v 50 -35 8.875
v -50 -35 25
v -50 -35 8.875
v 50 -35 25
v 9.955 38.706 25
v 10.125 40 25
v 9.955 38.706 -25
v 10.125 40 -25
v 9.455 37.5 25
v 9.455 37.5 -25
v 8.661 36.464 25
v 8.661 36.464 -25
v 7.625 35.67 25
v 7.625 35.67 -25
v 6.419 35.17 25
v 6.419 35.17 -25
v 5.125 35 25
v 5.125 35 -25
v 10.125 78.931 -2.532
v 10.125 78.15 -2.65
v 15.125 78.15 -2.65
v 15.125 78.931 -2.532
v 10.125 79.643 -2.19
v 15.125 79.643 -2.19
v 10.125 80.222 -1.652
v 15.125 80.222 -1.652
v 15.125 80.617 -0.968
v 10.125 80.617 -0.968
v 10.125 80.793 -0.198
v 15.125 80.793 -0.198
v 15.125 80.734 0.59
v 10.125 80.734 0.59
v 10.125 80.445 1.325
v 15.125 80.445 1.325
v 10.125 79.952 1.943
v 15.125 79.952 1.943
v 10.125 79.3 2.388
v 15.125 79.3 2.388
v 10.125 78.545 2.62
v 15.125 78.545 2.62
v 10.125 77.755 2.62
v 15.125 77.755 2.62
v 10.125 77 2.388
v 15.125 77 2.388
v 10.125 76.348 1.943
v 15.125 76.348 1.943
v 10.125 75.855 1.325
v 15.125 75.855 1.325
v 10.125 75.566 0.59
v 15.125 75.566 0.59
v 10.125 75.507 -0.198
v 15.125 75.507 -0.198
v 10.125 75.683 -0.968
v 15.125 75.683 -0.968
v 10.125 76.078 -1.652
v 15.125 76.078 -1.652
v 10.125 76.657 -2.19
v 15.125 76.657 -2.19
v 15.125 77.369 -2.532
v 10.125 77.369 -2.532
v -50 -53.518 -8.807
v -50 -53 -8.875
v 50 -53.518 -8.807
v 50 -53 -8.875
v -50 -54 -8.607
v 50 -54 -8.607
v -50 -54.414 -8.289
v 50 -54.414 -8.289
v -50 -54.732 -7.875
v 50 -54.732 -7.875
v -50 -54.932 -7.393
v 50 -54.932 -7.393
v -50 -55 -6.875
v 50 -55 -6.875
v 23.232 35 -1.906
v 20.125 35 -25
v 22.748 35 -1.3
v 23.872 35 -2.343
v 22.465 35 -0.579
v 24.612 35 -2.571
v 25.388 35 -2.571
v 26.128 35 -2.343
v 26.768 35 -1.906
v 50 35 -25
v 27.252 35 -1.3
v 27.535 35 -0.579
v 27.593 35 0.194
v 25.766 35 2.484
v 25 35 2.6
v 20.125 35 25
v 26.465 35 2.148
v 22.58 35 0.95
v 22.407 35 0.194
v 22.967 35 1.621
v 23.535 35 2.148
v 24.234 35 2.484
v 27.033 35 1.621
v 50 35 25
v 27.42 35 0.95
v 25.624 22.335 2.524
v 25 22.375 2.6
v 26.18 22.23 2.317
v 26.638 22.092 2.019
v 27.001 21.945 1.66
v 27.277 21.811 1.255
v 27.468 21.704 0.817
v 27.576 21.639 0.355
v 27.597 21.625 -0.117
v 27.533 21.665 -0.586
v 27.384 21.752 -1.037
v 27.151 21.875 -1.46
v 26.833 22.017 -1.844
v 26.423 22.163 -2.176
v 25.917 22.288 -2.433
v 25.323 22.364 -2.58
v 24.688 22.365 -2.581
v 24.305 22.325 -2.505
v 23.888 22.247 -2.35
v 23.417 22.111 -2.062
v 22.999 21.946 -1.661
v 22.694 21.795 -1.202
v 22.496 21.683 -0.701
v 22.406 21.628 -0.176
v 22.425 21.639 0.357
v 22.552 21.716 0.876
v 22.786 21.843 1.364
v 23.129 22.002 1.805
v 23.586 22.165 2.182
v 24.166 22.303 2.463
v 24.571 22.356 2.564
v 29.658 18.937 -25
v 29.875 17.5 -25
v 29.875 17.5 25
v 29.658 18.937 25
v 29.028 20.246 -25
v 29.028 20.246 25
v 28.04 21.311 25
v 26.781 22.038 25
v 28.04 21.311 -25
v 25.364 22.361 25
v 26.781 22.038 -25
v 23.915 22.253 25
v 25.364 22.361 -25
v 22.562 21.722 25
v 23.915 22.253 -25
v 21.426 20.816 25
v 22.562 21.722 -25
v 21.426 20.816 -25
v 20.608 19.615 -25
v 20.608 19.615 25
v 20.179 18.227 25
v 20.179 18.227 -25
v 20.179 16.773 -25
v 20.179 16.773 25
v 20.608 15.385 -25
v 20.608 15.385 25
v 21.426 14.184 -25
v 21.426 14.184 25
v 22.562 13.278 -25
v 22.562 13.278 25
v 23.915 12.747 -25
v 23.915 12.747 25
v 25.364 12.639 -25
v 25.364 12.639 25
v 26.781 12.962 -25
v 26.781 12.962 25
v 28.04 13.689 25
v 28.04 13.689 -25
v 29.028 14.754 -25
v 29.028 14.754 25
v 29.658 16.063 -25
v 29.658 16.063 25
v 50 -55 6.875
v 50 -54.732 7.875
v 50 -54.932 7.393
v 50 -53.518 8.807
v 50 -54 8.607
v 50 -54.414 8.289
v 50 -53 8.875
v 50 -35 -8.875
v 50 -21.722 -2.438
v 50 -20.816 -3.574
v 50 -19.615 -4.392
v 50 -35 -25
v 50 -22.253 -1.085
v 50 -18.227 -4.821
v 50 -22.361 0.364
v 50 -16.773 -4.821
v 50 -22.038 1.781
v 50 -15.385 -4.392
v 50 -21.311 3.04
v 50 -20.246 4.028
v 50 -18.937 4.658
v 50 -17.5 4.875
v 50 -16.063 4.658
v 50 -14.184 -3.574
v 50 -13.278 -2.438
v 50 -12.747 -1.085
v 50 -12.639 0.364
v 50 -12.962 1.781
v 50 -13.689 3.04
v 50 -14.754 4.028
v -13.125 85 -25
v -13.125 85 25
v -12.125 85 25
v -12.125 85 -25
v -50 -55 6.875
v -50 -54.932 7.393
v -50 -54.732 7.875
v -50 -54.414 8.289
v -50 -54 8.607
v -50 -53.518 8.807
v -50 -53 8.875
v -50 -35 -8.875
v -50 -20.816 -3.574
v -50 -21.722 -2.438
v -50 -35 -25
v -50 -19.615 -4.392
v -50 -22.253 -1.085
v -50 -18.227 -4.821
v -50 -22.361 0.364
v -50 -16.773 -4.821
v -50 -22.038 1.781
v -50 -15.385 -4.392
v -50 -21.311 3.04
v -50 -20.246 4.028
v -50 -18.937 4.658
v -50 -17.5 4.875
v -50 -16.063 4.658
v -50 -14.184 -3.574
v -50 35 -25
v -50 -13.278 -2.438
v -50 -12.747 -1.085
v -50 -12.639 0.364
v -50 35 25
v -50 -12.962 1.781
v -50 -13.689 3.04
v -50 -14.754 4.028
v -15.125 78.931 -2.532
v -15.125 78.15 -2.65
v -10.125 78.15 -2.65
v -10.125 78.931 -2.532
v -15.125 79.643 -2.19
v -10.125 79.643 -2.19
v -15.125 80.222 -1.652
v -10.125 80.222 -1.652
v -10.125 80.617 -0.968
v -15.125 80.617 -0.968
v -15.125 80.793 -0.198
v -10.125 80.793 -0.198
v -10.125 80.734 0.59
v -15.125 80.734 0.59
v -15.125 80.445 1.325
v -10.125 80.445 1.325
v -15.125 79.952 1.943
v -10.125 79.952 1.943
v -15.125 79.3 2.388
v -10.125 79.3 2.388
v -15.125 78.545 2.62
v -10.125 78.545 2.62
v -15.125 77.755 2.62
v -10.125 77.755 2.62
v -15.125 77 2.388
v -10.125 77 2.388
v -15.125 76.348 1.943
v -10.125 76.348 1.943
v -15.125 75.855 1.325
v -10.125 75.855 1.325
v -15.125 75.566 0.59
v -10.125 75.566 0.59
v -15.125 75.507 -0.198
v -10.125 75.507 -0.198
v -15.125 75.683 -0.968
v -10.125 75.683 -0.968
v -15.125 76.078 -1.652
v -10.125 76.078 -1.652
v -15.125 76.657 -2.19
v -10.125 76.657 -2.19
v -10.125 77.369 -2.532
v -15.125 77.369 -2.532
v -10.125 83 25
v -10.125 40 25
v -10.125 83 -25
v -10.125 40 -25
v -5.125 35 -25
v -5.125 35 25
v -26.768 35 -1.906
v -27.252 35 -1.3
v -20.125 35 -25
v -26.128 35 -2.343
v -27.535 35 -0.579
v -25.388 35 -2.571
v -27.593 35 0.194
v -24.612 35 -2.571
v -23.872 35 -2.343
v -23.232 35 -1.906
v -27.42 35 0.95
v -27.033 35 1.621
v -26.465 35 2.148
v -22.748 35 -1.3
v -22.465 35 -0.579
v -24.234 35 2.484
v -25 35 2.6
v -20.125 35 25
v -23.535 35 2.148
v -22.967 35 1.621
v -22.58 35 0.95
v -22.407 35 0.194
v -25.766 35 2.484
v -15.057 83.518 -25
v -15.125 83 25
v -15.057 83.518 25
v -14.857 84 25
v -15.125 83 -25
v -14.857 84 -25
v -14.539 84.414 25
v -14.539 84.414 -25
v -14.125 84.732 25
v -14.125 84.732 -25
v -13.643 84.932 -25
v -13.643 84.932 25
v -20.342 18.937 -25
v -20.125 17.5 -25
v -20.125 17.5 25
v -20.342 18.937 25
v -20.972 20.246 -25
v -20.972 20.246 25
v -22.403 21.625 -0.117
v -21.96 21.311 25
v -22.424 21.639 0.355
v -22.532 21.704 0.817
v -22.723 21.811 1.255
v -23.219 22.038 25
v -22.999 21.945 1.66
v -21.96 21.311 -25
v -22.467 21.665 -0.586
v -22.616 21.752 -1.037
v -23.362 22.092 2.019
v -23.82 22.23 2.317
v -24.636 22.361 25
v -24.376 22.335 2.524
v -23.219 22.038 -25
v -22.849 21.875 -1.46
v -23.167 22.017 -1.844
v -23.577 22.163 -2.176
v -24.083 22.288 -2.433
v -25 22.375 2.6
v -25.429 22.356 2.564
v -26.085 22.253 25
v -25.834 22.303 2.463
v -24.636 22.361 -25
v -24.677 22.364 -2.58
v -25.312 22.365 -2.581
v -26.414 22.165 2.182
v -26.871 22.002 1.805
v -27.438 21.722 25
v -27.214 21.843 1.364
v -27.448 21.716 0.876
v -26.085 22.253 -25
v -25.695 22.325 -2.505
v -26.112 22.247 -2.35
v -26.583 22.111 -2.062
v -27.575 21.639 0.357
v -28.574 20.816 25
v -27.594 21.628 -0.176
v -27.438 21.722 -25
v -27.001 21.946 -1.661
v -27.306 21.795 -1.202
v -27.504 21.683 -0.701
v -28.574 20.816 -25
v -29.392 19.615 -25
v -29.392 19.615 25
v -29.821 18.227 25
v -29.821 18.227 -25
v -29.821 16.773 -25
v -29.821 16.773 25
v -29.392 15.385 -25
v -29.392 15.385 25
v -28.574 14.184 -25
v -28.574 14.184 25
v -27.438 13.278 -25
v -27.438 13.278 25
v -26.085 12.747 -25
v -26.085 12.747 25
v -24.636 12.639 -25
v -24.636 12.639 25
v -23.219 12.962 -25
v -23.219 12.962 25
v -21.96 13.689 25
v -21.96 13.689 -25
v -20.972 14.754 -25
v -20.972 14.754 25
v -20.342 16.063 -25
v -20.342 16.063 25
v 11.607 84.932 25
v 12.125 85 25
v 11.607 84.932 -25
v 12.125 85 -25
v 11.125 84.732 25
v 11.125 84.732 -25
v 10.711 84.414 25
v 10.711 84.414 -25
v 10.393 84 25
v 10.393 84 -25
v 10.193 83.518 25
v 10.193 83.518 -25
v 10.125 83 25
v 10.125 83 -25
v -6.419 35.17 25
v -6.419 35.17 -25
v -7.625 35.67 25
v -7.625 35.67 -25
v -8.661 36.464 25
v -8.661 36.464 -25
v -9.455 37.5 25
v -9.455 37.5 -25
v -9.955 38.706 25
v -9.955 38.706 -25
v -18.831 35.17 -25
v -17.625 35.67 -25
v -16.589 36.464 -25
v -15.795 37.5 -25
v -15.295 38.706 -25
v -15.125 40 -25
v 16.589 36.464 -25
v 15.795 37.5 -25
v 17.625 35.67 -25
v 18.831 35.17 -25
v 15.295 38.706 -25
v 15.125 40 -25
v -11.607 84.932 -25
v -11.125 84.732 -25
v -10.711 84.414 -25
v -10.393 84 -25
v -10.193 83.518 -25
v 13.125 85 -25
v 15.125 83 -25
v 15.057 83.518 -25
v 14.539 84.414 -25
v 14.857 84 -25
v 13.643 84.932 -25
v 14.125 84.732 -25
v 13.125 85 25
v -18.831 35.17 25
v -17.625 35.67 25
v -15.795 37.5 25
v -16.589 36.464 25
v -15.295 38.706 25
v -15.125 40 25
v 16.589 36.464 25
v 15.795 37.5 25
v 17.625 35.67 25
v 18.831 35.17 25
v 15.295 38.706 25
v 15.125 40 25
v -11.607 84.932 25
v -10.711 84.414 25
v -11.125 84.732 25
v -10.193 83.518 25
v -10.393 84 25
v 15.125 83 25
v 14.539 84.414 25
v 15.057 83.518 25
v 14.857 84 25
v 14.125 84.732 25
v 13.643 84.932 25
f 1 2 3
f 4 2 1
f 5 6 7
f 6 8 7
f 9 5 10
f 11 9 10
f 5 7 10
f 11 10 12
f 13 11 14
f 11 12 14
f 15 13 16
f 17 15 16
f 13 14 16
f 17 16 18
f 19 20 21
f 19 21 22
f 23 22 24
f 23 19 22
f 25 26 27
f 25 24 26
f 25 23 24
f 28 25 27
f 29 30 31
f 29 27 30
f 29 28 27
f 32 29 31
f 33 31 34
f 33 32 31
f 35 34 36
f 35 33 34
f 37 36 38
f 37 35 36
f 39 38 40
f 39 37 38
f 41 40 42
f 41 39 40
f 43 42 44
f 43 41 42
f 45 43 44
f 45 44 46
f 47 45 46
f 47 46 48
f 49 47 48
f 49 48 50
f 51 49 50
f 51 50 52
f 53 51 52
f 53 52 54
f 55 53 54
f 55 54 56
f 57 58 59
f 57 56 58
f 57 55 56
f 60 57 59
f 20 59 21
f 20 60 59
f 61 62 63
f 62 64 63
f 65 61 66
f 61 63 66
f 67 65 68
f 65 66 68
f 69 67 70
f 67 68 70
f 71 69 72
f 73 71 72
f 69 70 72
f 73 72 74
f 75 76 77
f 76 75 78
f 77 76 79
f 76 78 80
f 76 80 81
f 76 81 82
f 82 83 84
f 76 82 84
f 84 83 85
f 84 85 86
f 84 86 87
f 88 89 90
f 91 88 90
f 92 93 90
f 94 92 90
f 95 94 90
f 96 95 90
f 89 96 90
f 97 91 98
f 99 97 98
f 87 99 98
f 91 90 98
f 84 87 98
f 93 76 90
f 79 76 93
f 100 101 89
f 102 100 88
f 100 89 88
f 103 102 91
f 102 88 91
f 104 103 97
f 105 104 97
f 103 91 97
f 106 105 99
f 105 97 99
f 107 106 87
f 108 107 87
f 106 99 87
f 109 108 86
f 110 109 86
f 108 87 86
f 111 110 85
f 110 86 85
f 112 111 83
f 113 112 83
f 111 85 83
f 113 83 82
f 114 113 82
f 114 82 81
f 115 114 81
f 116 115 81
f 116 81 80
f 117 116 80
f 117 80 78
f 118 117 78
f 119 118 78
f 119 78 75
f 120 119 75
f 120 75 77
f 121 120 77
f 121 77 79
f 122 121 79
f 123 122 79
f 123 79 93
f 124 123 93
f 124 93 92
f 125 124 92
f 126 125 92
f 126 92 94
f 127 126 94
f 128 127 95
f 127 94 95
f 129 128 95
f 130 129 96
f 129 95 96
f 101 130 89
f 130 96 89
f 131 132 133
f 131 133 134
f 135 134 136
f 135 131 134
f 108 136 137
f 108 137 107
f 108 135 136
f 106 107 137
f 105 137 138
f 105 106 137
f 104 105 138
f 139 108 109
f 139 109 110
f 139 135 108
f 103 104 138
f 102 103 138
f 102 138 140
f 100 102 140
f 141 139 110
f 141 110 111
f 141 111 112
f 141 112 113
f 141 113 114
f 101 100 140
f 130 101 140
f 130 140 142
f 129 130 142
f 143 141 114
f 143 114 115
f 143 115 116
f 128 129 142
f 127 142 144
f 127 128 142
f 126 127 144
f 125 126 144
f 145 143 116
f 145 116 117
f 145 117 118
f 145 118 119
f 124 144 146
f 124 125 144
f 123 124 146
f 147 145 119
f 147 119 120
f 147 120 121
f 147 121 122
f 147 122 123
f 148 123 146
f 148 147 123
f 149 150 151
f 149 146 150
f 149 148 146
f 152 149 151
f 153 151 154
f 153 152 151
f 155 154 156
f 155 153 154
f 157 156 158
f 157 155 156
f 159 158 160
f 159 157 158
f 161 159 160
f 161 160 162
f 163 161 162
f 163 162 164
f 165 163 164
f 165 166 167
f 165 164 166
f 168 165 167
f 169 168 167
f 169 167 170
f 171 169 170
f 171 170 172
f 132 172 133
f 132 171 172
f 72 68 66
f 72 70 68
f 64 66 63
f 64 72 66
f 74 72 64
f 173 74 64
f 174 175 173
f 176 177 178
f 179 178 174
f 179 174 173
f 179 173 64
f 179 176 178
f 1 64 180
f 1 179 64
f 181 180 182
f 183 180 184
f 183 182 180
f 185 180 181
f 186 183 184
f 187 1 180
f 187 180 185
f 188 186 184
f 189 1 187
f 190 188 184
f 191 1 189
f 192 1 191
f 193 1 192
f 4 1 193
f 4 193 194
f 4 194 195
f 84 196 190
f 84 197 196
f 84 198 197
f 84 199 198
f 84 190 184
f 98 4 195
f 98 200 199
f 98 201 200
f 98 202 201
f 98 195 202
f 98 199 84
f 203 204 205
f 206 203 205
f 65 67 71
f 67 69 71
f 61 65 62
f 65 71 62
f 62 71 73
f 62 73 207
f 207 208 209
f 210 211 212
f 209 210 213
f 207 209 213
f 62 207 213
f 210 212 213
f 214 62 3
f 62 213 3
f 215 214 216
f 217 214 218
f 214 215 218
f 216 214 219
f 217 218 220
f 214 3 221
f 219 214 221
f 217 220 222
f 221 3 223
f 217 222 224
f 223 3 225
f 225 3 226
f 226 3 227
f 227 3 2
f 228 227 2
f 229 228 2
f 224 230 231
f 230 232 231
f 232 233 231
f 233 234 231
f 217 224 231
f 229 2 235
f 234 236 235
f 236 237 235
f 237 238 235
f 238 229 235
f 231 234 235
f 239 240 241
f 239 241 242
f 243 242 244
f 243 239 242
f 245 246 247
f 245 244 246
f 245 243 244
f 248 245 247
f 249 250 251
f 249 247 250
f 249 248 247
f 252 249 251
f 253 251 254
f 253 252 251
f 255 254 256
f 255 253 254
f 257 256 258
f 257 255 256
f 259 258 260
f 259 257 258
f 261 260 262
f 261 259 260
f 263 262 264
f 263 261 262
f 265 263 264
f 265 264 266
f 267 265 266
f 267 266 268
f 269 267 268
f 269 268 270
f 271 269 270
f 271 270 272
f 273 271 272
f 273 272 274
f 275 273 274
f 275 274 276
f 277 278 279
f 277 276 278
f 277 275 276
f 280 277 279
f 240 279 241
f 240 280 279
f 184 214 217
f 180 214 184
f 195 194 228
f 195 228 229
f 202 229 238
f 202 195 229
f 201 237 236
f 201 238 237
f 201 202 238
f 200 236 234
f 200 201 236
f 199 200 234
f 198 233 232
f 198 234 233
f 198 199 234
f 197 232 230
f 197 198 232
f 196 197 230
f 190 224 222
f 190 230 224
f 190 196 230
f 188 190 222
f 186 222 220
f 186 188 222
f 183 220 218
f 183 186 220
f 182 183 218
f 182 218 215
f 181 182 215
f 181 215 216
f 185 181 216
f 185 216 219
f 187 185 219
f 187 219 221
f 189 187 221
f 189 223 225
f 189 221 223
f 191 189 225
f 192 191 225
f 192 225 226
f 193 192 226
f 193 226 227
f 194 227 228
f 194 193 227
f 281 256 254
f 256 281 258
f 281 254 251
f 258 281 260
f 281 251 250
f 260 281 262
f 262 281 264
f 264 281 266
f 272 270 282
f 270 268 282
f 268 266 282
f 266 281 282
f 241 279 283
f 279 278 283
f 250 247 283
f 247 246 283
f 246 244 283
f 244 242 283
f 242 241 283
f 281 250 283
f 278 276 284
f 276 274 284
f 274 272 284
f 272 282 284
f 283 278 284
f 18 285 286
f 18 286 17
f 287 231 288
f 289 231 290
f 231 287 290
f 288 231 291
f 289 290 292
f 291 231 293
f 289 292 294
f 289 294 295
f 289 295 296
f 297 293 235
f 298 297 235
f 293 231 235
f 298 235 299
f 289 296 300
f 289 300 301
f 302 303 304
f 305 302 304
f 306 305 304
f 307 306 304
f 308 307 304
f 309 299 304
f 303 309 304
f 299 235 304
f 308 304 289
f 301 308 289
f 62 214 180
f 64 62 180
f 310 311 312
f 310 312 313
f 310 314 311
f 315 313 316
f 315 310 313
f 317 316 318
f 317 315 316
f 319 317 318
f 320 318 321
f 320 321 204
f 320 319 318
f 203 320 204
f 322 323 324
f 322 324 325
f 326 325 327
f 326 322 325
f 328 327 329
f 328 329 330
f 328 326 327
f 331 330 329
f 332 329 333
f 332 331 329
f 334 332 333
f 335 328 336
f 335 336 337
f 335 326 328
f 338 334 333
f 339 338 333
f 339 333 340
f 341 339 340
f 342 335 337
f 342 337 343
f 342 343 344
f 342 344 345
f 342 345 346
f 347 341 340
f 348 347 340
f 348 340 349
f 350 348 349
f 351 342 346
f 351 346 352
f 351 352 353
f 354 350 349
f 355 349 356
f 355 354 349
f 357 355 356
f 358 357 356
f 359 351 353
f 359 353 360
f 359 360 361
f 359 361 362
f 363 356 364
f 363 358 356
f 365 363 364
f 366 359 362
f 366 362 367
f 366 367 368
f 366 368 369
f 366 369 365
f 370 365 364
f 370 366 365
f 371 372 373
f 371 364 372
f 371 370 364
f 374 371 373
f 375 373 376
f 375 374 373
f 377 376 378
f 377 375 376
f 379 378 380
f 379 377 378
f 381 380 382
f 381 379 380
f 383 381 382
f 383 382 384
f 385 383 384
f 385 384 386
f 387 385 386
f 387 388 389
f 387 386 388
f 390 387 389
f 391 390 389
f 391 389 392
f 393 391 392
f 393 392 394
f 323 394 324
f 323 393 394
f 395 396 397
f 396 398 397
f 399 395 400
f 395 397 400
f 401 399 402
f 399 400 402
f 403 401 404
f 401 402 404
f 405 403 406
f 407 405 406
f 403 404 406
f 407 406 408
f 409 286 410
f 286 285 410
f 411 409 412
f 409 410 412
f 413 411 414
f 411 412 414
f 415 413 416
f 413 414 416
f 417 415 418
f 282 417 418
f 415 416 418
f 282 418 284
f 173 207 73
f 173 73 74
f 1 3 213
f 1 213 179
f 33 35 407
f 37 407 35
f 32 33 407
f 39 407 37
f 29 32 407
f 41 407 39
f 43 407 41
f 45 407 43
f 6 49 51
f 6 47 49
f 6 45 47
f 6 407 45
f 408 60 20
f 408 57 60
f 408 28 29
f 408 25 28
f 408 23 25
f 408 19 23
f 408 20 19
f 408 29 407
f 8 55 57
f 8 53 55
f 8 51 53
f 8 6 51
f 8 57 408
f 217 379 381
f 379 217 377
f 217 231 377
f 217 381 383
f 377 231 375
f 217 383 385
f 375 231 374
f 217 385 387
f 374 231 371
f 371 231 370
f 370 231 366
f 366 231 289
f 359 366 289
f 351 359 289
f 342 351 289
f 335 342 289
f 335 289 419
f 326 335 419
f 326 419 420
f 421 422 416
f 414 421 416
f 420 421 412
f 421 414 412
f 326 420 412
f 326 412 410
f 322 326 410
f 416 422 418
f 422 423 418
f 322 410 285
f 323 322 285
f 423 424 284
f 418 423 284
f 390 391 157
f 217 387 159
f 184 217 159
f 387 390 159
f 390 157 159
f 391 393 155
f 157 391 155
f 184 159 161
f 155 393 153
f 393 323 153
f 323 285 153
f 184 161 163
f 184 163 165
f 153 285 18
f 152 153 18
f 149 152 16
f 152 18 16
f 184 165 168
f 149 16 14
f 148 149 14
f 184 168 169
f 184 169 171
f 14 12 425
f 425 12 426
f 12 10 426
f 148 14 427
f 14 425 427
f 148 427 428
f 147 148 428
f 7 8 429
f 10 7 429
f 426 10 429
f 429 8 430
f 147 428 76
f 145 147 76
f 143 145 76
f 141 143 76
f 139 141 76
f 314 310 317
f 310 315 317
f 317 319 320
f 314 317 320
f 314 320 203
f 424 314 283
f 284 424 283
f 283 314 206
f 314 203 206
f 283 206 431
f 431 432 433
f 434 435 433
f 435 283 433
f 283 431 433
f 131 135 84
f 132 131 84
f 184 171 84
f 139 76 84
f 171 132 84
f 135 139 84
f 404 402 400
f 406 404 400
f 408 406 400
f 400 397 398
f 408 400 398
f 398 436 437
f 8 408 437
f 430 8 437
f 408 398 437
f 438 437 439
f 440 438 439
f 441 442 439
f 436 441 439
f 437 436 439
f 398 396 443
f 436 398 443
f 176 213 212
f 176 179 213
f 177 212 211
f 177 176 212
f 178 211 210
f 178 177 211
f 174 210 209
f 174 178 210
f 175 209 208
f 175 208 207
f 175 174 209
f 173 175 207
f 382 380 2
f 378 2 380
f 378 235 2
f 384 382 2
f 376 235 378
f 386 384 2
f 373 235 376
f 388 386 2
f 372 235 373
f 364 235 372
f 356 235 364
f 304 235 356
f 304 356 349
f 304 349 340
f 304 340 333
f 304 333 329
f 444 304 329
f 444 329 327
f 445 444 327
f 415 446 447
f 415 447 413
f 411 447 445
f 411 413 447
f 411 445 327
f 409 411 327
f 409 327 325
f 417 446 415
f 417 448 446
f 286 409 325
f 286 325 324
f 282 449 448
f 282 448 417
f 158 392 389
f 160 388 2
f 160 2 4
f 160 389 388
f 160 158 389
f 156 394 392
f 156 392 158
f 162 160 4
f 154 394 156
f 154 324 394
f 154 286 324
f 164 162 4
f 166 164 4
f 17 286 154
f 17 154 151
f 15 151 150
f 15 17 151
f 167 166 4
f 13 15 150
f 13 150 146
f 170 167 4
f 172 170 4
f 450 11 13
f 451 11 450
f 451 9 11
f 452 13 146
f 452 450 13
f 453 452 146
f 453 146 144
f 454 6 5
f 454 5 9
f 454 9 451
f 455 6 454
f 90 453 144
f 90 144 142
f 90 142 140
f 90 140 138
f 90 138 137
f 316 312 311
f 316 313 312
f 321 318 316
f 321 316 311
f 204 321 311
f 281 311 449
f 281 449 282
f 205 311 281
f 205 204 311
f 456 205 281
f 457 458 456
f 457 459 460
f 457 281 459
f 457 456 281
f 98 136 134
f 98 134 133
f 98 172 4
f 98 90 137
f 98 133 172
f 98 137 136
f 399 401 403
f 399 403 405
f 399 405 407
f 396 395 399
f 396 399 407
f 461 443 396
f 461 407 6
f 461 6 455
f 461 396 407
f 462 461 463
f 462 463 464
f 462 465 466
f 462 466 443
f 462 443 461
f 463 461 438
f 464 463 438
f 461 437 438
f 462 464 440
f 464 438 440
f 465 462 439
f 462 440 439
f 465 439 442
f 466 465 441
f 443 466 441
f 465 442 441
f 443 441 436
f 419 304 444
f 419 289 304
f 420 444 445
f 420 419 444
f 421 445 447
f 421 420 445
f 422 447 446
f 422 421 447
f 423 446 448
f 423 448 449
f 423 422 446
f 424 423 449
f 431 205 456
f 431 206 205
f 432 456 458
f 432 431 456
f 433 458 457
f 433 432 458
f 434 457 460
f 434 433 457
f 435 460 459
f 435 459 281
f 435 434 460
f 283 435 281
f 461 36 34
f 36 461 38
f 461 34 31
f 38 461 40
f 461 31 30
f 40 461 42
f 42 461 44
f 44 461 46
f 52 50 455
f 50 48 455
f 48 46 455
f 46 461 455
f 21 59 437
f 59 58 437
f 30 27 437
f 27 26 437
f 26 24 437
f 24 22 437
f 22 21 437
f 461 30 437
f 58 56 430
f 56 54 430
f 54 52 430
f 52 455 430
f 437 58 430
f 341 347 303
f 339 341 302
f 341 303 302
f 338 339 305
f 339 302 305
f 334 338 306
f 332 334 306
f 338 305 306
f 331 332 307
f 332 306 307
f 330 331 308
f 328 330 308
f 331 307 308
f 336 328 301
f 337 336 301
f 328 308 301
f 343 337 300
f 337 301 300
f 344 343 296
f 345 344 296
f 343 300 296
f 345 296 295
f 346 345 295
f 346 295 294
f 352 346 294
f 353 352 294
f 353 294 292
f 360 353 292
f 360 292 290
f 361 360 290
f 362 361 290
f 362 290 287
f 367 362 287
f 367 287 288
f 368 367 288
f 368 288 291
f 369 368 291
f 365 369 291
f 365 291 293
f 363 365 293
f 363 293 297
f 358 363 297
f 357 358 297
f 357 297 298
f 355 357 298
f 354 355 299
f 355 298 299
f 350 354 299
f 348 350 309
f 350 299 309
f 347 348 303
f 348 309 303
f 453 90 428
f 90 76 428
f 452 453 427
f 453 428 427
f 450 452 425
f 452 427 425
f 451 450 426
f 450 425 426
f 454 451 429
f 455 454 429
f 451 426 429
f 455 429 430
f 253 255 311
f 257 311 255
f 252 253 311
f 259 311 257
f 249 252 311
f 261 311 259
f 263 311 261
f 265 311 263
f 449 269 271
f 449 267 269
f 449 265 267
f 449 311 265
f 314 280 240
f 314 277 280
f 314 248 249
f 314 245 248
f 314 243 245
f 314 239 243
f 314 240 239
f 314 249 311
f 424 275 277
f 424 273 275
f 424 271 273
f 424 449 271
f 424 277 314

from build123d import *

# Parameters (mm, degrees)
SKETCH1_W               = 100
SKETCH1_H               = 70
BOSS_EXTRUDE1_DEPTH     = 25
CUT_EXTRUDE1_DEPTH      = 79.89866919
CUT_EXTRUDE1_DEPTH_BACK = 79.89866919
SKETCH2_R               = 4.875
CUT_EXTRUDE2_DEPTH      = 109.857705285
CUT_EXTRUDE2_DEPTH_BACK = 109.857705285
SKETCH3_R               = 4.875
SKETCH4_R               = 2.6
CUT_EXTRUDE4_DEPTH      = 20
SKETCH5_W               = 100
SKETCH5_H               = 17.75
BOSS_EXTRUDE2_DEPTH     = 20
FILLET1_R               = 2
SKETCH6_W               = 5
SKETCH6_H               = 50
BOSS_EXTRUDE3_DEPTH     = 50
CUT_EXTRUDE5_DEPTH      = 110.960291151
CUT_EXTRUDE5_DEPTH_BACK = 110.960291151
SKETCH7_R               = 2.65
FILLET2_R               = 5
FILLET3_R               = 2


with BuildPart() as part:
    # Sketch1 → Boss-Extrude1 (new, symmetric)
    with BuildSketch(Plane.XY):
        Rectangle(SKETCH1_W, SKETCH1_H)
    extrude(amount=BOSS_EXTRUDE1_DEPTH, both=True)

    # Sketch2 → Cut-Extrude1 (cut, two sides: drawn at the far end of the back side and taken through both)
    with BuildSketch(Plane.XY.offset(25).offset(-CUT_EXTRUDE1_DEPTH_BACK)):
        with Locations((25, 17.5)):
            Circle(SKETCH2_R)
        with Locations((-25, 17.5)):
            Circle(SKETCH2_R)
    extrude(amount=CUT_EXTRUDE1_DEPTH + CUT_EXTRUDE1_DEPTH_BACK, mode=Mode.SUBTRACT)

    # Sketch3 → Cut-Extrude2 (cut, two sides: drawn at the far end of the back side and taken through both)
    with BuildSketch(Plane.ZY.offset(50).offset(-CUT_EXTRUDE2_DEPTH_BACK)):
        with Locations((0, -17.5)):
            Circle(SKETCH3_R)
    extrude(amount=CUT_EXTRUDE2_DEPTH + CUT_EXTRUDE2_DEPTH_BACK, mode=Mode.SUBTRACT)

    # Sketch4 → Cut-Extrude4 (cut)
    with BuildSketch(Plane(origin=(0, 35, 0), x_dir=(1, 0, 0), z_dir=(0, 1, 0))):
        with Locations(Location((-25, 0, 0), (0, 0, 270))):
            Circle(SKETCH4_R)
        with Locations(Location((25, 0, 0), (0, 0, 270))):
            Circle(SKETCH4_R)
    extrude(amount=-CUT_EXTRUDE4_DEPTH, mode=Mode.SUBTRACT)

    # Sketch5 → Boss-Extrude2 (add)
    with BuildSketch(Plane.XZ.offset(35)):
        Rectangle(SKETCH5_W, SKETCH5_H)
    extrude(amount=BOSS_EXTRUDE2_DEPTH)

    # Fillet1
    fillet1_edges = [part.edges().sort_by_distance(p)[0] for p in [
        (0, -55, 8.875),
        (0, -55, -8.875),
    ]]
    fillet(fillet1_edges, radius=FILLET1_R)

    # Sketch6 → Boss-Extrude3 (add)
    with BuildSketch(Plane(origin=(0, 35, 0), x_dir=(1, 0, 0), z_dir=(0, 1, 0))):
        with Locations((-12.625, 0)):
            Rectangle(SKETCH6_W, SKETCH6_H)
        with Locations((12.625, 0)):
            Rectangle(SKETCH6_W, SKETCH6_H)
    extrude(amount=BOSS_EXTRUDE3_DEPTH)

    # Sketch7 → Cut-Extrude5 (cut, two sides: drawn at the far end of the back side and taken through both)
    with BuildSketch(Plane(origin=(15.125, 0, 0), x_dir=(0, 0, -1), z_dir=(1, 0, 0)).offset(-CUT_EXTRUDE5_DEPTH_BACK)):
        with Locations((0, 78.15)):
            Circle(SKETCH7_R)
    extrude(amount=CUT_EXTRUDE5_DEPTH + CUT_EXTRUDE5_DEPTH_BACK, mode=Mode.SUBTRACT)

    # Fillet2
    fillet2_edges = [part.edges().sort_by_distance(p)[0] for p in [
        (15.125, 35, 0),
        (10.125, 35, 0),
        (-15.125, 35, 0),
        (-10.125, 35, 0),
    ]]
    fillet(fillet2_edges, radius=FILLET2_R)

    # Fillet3
    fillet3_edges = [part.edges().sort_by_distance(p)[0] for p in [
        (15.125, 85, 0),
        (10.125, 85, 0),
        (-15.125, 85, 0),
        (-10.125, 85, 0),
    ]]
    fillet(fillet3_edges, radius=FILLET3_R)


solid = part.part
